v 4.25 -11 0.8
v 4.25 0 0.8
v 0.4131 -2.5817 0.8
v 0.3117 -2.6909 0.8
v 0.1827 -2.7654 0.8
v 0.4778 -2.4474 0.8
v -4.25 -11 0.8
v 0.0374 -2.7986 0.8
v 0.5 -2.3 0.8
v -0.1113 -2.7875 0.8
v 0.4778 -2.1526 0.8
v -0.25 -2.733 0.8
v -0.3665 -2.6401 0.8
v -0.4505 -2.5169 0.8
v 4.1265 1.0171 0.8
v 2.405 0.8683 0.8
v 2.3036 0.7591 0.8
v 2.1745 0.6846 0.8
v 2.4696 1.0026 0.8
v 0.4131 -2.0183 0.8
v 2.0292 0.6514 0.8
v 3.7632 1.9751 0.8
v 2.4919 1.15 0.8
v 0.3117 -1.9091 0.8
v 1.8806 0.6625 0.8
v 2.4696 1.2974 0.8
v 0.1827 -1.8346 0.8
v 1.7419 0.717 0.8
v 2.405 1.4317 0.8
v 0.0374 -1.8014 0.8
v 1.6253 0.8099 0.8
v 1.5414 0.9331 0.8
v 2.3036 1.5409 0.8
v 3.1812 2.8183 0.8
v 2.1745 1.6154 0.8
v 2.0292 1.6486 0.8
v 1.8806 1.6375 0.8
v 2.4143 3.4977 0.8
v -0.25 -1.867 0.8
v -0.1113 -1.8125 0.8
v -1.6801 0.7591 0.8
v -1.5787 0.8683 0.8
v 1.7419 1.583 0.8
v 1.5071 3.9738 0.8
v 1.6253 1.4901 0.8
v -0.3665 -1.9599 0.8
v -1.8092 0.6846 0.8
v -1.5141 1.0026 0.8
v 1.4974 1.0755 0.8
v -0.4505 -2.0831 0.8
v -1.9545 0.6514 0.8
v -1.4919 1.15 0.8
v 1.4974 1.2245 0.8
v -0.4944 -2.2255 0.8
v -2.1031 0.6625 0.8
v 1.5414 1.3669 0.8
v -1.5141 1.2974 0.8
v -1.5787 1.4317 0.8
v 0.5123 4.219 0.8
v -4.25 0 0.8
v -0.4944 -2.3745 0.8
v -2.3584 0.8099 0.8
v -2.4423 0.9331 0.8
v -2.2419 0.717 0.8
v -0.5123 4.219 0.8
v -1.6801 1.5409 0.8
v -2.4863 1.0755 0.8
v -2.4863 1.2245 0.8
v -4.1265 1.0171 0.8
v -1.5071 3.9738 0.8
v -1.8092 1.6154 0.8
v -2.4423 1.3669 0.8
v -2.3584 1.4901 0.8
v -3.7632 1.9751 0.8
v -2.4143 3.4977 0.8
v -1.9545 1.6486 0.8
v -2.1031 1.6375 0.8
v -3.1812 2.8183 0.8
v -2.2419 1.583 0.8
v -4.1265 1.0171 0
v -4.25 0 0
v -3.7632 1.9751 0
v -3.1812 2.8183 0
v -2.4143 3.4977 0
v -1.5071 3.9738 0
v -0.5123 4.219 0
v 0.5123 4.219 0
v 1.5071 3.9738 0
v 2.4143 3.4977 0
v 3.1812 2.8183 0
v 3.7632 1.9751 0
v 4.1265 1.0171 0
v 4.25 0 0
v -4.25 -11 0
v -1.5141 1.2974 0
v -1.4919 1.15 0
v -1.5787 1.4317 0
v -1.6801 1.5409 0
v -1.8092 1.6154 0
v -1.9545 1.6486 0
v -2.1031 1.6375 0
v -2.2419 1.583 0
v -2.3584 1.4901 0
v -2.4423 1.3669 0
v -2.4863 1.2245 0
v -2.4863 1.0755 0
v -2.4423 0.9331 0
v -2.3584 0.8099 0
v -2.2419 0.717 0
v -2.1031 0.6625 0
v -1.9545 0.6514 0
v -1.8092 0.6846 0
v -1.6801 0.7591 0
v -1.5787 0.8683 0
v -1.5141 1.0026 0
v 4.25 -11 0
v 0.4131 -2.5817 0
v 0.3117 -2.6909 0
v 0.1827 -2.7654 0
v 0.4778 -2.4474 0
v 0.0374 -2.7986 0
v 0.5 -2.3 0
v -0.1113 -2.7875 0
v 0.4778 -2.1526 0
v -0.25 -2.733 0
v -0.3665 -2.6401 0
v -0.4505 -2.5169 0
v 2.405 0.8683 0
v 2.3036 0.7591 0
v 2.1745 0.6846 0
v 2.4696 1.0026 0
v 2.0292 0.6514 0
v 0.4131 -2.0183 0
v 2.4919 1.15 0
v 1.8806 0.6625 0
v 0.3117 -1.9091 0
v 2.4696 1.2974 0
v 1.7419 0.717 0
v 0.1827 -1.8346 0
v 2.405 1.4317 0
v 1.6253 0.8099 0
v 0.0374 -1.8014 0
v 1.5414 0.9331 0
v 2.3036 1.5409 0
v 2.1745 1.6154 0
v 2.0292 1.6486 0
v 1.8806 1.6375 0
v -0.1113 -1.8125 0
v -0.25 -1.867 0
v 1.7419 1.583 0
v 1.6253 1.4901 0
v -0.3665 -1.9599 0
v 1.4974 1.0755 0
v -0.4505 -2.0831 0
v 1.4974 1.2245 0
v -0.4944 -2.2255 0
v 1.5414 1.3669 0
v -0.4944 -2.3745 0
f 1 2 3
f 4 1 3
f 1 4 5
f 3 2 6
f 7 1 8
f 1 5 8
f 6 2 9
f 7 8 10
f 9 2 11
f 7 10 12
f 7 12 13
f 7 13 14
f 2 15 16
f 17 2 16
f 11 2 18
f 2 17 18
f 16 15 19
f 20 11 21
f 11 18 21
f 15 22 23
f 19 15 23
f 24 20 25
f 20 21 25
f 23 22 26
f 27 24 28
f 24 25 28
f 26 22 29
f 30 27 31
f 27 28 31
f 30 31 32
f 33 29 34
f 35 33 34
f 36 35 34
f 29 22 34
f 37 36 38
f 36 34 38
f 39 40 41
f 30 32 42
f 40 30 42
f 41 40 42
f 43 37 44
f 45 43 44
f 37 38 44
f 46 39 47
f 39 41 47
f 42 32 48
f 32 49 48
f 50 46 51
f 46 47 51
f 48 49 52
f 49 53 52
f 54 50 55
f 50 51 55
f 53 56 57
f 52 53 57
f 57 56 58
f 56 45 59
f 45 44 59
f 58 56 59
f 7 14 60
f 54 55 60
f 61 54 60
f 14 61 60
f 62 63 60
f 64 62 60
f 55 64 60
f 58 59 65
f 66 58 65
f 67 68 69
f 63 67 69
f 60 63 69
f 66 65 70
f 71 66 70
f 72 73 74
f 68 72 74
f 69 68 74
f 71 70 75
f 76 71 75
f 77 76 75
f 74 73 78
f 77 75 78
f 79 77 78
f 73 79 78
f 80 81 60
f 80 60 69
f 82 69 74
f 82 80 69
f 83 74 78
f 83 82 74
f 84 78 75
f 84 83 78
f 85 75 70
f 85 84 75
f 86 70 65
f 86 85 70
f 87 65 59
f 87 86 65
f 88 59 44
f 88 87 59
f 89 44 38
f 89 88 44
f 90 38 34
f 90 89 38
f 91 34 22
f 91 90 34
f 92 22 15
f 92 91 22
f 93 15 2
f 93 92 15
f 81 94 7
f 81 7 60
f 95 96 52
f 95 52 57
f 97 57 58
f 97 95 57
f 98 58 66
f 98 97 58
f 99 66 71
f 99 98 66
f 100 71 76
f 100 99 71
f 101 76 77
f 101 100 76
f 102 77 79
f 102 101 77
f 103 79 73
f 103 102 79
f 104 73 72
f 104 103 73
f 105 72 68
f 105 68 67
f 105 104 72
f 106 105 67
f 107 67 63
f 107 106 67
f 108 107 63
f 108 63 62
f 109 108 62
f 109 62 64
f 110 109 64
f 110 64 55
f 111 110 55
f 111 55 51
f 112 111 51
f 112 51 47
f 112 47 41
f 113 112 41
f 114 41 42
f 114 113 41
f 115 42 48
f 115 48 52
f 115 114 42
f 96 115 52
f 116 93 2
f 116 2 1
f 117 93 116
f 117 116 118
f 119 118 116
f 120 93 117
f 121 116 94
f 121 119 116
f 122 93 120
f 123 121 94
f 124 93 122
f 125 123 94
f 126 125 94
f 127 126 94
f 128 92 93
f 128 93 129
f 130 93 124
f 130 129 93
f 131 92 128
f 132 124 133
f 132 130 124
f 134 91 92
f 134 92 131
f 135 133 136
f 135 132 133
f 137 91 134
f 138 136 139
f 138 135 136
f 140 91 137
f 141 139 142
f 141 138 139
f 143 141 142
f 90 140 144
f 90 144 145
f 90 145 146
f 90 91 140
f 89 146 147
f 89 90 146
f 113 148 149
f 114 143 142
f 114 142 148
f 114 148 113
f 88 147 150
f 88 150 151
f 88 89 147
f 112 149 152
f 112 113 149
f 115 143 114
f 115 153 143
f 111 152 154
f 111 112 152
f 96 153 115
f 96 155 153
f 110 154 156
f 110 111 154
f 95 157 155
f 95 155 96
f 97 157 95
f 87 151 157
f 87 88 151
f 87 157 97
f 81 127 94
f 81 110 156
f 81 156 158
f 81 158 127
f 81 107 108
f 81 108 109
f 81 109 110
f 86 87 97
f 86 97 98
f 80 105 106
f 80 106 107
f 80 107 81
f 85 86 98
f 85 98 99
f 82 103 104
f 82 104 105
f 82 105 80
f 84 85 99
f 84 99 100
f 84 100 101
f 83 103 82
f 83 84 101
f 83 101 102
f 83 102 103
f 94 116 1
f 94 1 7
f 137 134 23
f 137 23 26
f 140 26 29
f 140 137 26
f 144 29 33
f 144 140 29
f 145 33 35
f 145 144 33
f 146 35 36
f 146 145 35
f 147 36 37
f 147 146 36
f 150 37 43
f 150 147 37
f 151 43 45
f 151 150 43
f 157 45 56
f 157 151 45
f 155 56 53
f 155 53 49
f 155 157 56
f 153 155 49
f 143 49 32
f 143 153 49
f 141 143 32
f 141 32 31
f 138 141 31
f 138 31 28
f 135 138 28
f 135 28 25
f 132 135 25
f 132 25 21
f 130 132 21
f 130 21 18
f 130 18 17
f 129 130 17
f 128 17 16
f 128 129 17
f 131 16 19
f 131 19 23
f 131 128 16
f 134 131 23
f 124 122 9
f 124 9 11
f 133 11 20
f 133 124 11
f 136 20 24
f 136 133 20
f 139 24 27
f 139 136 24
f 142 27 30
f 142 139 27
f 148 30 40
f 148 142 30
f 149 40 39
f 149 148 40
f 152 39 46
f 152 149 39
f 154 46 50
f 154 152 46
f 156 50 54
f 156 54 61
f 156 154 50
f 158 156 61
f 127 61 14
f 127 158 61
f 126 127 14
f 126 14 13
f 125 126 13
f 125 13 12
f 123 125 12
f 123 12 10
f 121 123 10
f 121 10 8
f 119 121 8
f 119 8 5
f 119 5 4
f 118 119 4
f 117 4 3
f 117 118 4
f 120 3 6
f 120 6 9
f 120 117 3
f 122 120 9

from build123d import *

# Parameters (mm, degrees)
SKETCH1_R           = 0.5
BOSS_EXTRUDE1_DEPTH = 0.8


with BuildPart() as part:
    # Sketch1 → Boss-Extrude1 (new body)
    with BuildSketch(Plane.XY):
        with BuildLine():
            Line((4.25, 0), (4.25, -11))
            Line((4.25, -11), (-4.25, -11))
            Line((-4.25, -11), (-4.25, 0))
            ThreePointArc((-4.25, 0), (0, 4.25), (4.25, 0))
        make_face()
        with Locations((0, -2.3)):
            Circle(SKETCH1_R, mode=Mode.SUBTRACT)
        with Locations((-1.991858429, 1.15)):
            Circle(SKETCH1_R, mode=Mode.SUBTRACT)
        with Locations((1.991858429, 1.15)):
            Circle(SKETCH1_R, mode=Mode.SUBTRACT)
    extrude(amount=BOSS_EXTRUDE1_DEPTH)


solid = part.part
